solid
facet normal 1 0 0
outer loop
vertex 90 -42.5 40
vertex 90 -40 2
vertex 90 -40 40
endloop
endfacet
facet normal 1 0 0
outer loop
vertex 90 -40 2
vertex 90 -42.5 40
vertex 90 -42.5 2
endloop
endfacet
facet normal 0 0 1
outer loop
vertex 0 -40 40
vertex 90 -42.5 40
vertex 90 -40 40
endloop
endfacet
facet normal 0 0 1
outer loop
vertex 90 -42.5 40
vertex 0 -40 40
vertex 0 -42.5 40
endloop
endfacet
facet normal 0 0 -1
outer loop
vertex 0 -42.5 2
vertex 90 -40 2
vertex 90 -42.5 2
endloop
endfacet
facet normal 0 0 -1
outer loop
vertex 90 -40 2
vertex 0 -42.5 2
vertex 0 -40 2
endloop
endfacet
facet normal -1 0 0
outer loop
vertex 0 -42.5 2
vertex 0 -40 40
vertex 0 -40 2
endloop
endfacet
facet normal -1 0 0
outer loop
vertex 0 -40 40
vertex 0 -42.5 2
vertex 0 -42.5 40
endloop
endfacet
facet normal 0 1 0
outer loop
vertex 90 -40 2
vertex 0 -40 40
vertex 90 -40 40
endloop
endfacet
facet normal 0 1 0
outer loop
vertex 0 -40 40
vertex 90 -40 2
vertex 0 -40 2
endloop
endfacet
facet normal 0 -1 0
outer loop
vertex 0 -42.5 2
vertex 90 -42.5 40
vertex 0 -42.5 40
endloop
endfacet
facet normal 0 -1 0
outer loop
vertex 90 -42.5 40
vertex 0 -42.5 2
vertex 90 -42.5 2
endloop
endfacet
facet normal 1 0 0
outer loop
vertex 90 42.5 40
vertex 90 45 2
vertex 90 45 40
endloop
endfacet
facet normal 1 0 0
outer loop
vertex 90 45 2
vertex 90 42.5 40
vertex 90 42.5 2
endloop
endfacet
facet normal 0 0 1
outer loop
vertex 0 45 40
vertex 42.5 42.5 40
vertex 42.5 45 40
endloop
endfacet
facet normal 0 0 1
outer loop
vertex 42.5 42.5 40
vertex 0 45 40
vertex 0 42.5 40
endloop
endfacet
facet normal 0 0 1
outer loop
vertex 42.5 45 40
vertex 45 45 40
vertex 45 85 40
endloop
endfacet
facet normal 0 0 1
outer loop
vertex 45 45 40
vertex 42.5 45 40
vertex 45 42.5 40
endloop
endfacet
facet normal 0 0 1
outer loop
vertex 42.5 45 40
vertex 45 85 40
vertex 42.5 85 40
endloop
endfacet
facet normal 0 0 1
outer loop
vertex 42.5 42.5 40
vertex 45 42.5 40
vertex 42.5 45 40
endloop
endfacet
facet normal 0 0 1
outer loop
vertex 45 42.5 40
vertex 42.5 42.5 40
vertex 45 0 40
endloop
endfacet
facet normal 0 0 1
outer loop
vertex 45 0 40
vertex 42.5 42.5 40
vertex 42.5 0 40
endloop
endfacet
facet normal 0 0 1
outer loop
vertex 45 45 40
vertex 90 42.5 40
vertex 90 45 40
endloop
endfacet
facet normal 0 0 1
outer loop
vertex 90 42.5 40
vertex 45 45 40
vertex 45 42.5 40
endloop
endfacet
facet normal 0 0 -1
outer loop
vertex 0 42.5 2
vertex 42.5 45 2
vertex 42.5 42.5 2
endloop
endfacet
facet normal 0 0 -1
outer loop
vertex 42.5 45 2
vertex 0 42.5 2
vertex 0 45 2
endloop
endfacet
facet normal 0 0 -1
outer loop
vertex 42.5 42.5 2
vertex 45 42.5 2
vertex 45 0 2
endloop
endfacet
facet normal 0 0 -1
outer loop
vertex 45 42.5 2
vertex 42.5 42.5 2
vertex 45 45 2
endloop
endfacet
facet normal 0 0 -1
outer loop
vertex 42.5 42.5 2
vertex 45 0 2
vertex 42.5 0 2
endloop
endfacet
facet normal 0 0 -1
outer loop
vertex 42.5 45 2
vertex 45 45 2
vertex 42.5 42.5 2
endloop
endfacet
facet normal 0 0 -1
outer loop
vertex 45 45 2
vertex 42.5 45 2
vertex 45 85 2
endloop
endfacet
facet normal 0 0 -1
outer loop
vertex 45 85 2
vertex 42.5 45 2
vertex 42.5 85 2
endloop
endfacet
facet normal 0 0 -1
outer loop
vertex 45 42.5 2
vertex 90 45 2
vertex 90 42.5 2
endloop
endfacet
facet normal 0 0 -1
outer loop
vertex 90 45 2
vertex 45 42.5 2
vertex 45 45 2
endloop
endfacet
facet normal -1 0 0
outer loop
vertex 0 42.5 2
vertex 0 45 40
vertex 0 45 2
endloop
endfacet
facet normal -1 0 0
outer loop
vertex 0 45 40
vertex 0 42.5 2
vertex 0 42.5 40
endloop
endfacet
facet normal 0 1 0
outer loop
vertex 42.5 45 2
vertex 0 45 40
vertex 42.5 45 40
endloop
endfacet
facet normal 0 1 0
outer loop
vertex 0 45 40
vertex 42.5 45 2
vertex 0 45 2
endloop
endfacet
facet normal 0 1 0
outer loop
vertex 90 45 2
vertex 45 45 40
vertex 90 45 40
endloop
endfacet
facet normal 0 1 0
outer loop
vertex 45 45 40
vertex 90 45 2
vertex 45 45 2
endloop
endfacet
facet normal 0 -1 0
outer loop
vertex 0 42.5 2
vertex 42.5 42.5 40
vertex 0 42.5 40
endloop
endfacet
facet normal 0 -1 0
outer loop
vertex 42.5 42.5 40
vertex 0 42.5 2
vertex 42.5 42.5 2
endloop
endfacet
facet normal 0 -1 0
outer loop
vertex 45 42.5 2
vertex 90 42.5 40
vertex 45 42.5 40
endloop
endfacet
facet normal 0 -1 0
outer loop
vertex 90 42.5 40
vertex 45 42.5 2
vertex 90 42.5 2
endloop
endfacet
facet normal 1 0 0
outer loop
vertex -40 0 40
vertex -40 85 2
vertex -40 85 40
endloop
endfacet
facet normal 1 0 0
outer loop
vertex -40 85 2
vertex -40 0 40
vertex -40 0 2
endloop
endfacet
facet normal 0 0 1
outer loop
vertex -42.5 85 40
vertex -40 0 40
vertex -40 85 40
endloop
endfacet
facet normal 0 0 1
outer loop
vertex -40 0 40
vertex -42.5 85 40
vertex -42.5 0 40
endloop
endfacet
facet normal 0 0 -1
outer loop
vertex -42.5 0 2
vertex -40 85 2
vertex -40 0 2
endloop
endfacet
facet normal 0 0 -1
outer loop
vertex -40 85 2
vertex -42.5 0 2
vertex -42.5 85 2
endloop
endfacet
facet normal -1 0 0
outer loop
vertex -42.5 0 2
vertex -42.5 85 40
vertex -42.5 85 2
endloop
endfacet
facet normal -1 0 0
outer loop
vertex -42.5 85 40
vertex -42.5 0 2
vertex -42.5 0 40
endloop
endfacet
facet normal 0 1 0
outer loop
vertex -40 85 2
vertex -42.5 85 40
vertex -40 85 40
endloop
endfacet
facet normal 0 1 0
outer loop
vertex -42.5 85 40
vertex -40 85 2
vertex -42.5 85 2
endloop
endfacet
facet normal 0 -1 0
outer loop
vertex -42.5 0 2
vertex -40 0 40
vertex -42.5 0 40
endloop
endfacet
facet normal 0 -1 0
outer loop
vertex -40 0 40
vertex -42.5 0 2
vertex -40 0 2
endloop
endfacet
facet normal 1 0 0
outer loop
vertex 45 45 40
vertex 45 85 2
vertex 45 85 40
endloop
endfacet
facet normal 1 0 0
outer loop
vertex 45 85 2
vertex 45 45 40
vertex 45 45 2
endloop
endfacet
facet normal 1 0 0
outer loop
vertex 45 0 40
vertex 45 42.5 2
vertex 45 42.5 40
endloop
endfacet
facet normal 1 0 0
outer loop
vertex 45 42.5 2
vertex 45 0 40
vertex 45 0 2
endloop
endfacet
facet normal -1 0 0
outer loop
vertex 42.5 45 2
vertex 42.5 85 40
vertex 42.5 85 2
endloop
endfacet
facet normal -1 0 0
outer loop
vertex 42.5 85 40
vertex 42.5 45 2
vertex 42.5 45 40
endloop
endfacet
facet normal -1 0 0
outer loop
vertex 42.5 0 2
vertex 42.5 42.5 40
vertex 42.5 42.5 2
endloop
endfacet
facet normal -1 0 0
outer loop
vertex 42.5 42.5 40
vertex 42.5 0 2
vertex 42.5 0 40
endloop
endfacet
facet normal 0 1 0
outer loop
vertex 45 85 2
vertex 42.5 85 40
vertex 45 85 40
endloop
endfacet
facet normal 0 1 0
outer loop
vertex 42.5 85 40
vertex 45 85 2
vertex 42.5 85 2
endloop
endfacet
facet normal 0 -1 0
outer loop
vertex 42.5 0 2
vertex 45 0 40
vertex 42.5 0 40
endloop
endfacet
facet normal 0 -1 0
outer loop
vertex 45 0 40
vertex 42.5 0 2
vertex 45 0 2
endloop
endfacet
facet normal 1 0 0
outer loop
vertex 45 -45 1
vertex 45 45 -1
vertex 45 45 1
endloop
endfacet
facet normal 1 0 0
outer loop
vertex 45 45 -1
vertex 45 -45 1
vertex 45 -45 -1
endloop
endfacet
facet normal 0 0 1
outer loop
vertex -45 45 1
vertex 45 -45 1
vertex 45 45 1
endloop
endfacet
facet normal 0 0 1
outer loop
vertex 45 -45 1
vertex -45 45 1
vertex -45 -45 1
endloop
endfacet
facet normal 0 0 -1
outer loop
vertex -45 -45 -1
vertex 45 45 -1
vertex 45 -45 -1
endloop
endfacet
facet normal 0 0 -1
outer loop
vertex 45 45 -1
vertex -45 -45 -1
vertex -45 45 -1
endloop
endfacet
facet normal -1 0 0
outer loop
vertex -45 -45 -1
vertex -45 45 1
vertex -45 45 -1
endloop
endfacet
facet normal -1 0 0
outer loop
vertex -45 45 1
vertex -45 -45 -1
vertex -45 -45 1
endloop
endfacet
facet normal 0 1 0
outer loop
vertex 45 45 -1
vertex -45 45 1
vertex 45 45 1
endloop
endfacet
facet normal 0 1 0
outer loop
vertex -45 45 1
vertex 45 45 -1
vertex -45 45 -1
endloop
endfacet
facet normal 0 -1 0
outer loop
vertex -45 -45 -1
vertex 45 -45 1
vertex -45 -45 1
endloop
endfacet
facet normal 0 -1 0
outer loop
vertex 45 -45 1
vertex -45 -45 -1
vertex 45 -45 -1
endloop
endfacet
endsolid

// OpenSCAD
// Dimensions for DIY Magnetic Stirrer Housing (80mm PC Fan)
// Units: millimetres

// Overall outer footprint
outer_width = 90;
outer_depth = 90;

// Top plate thickness (rests on bed)
top_thickness = 2;

// Wall thickness
wall_thickness = 2.5;

// Total height of the box (from top plate to open edge)
box_height = 40;

// Screw hole diameter
screw_hole_dia = 4.5;

// Screw hole pattern size (square)
screw_pattern = 71.5;

// Cable notch width
notch_width = 12;

// Cable notch depth from open edge
notch_depth = 8;

// Calculate inner dimensions
inner_width = outer_width - 2 * wall_thickness;
inner_depth = outer_depth - 2 * wall_thickness;

// Calculate wall height (from top of plate to open edge)
wall_height = box_height - top_thickness;

// Calculate screw hole positions (centered on 71.5mm square)
screw_offset = screw_pattern / 2;

// Calculate notch position (centered on one wall, e.g., front wall at Y = -inner_depth/2)
// The notch is on the wall at Y = -inner_depth/2 (front face)
notch_y_center = -inner_depth / 2;
notch_z_start = box_height - notch_depth; // 40 - 8 = 32
notch_z_end = box_height; // 40

// Main body: Top plate
module top_plate() {
    cube([outer_width, outer_depth, top_thickness], center = true);
}

// Main body: Four walls
module walls() {
    // Front wall (Y = -inner_depth/2)
    // Centered at Y = -inner_depth/2, X = 0
    translate([0, -inner_depth/2, top_thickness])
        cube([outer_width, wall_thickness, wall_height], center = false);
    
    // Back wall (Y = inner_depth/2)
    translate([0, inner_depth/2, top_thickness])
        cube([outer_width, wall_thickness, wall_height], center = false);
    
    // Left wall (X = -inner_width/2)
    translate([-inner_width/2, 0, top_thickness])
        cube([wall_thickness, inner_depth, wall_height], center = false);
    
    // Right wall (X = inner_width/2)
    translate([inner_width/2, 0, top_thickness])
        cube([wall_thickness, inner_depth, wall_height], center = false);
}

// Cable notch cutout
module cable_notch() {
    // Notch is on the front wall (Y = -inner_depth/2)
    // We cut a rectangular prism from the front face
    // The notch goes from z=32 to z=40 (depth 8)
    // It is centered on the wall (Y = -inner_depth/2)
    // The wall thickness is 2.5, so we cut through it.
    // We need to ensure the cut extends slightly past the face to avoid coplanar issues.
    translate([0, -inner_depth/2 - wall_thickness/2, notch_z_start])
        cube([notch_width, wall_thickness + 0.01, notch_depth], center = false);
}

// Screw holes
module screw_holes() {
    for (i = [-1, 1]) {
        for (j = [-1, 1]) {
            translate([i * screw_offset, j * screw_offset, 0])
                cylinder(d = screw_hole_dia, h = box_height + 0.01, center = true);
        }
    }
}

// Main assembly
union() {
    // Base plate
    top_plate();
    
    // Walls
    walls();
    
    // Cable notch (difference from walls)
    difference() {
        walls();
        cable_notch();
    }
    
    // Screw holes (difference from plate and walls)
    difference() {
        union() {
            top_plate();
            walls();
        }
        screw_holes();
    }
}
